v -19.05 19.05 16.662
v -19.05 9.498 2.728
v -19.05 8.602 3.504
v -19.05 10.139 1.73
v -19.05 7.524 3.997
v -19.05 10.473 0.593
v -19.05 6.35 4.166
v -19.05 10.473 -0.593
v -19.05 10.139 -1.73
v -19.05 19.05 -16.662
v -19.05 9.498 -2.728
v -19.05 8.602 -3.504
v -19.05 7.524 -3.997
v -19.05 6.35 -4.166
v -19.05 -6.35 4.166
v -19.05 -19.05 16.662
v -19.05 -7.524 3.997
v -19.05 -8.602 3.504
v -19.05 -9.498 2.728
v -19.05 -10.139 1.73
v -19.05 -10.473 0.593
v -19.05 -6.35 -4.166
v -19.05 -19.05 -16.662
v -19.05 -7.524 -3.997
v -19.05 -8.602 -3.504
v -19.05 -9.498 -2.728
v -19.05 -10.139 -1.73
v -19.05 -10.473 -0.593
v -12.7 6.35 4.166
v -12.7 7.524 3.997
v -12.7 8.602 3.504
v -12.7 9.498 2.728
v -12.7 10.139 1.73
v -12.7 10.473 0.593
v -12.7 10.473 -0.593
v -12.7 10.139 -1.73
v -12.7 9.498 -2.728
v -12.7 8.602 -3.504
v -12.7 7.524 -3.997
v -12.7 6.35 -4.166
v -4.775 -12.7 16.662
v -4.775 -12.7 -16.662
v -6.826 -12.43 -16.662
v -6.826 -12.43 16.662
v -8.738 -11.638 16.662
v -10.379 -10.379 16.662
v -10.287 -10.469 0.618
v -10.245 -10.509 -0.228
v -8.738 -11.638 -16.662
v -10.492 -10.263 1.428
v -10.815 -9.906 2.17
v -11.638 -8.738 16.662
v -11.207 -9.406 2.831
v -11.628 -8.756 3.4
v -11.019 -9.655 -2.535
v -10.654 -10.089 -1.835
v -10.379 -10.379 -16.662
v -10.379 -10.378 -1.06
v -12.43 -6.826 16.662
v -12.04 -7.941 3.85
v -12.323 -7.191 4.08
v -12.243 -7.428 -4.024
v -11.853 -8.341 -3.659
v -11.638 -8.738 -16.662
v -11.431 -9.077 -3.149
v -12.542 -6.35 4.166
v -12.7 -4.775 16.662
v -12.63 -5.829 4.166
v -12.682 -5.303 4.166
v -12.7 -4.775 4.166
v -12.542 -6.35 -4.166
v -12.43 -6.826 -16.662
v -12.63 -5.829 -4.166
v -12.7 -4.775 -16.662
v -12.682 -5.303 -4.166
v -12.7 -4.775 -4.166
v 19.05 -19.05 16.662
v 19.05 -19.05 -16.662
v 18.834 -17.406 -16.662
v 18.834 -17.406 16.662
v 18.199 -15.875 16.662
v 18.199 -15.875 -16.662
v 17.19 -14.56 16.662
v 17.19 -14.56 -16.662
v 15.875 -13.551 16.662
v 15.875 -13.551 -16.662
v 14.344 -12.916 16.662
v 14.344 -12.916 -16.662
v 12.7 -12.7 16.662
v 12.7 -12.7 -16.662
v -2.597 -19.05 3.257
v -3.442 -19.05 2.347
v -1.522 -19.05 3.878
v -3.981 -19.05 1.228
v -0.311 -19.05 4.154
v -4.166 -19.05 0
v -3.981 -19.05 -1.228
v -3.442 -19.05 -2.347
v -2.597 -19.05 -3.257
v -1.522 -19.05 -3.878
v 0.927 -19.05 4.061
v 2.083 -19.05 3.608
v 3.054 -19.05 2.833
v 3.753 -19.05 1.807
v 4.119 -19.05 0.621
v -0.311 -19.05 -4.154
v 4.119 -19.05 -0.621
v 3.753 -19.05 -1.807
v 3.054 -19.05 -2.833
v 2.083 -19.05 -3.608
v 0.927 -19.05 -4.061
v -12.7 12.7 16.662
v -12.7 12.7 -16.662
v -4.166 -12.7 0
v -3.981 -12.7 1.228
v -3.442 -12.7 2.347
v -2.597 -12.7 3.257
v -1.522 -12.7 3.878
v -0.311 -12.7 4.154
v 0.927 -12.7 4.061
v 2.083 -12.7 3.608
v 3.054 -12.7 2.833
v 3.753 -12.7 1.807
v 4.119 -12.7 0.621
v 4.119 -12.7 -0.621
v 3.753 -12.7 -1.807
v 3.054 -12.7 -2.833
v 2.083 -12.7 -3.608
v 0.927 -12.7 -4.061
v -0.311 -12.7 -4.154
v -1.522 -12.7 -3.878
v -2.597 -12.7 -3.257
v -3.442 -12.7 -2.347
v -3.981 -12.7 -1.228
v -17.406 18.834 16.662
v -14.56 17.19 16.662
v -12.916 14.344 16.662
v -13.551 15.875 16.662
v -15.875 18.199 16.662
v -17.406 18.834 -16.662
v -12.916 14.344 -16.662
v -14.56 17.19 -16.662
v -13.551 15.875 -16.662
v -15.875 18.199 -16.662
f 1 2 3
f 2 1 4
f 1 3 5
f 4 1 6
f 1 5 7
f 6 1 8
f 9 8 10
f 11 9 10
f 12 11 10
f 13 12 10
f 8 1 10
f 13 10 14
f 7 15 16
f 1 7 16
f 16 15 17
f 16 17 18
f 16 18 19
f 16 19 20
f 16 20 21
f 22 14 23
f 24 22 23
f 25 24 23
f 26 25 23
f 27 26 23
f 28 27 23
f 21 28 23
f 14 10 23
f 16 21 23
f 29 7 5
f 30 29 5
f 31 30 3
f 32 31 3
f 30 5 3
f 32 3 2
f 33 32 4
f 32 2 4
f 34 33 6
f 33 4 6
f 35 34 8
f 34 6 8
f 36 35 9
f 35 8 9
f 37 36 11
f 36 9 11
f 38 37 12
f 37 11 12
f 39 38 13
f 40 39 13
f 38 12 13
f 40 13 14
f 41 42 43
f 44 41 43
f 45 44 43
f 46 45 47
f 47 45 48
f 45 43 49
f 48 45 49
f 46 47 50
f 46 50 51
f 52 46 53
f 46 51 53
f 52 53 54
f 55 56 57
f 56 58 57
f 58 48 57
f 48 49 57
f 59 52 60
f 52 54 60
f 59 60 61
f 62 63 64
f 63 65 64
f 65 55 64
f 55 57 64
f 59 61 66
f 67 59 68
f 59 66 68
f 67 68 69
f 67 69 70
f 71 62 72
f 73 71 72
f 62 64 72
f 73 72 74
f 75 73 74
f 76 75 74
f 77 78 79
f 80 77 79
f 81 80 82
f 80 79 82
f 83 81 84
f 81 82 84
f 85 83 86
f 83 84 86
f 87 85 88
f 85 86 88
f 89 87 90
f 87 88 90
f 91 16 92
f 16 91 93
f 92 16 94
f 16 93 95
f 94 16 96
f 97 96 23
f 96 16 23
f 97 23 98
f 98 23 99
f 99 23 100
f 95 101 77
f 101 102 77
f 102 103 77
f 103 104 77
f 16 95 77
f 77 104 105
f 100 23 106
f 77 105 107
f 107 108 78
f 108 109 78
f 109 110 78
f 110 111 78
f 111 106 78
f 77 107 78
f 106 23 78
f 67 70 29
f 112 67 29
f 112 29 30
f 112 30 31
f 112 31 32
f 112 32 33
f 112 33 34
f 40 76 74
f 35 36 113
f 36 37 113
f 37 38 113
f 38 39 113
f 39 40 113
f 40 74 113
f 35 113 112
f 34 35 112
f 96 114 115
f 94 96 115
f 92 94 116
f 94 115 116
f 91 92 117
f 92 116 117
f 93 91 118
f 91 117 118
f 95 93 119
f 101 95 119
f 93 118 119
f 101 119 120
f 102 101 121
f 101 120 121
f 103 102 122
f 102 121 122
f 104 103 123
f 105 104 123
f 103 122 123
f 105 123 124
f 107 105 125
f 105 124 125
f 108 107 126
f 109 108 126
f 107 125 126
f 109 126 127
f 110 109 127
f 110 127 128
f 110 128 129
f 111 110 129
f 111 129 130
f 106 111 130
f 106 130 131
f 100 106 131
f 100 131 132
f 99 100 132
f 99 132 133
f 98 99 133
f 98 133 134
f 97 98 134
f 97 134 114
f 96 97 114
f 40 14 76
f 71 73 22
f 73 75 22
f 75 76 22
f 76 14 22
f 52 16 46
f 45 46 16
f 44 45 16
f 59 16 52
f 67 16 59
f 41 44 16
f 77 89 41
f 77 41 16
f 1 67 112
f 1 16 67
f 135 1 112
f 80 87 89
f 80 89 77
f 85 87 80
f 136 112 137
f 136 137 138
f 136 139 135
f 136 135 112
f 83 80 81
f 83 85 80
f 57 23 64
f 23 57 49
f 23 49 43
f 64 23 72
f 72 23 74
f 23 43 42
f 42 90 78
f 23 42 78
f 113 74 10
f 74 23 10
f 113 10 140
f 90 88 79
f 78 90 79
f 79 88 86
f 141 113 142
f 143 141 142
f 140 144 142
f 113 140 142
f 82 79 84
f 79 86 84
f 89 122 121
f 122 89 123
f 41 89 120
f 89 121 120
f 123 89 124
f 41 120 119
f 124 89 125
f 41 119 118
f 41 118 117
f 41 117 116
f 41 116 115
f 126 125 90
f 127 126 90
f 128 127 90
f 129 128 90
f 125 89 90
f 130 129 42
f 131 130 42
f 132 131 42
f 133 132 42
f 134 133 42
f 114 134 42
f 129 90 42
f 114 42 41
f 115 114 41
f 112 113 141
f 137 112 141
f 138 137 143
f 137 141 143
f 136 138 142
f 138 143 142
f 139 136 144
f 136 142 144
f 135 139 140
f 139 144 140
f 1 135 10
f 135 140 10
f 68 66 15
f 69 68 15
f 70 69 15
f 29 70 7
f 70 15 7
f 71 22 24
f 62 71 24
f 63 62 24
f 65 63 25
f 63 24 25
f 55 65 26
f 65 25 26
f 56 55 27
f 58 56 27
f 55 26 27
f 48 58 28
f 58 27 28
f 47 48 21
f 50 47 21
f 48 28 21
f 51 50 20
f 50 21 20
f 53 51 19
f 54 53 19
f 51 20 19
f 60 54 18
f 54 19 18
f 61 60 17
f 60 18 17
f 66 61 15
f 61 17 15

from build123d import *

# Parameters (mm, degrees)
BOSS_EXTRUDE1_DEPTH      = 16.6624
BOSS_EXTRUDE1_DEPTH_BACK = 16.6624
CUT_EXTRUDE1_DEPTH       = 41.602962623
CUT_EXTRUDE1_DEPTH_BACK  = 41.602962623
SKETCH6_R                = 4.1656
CUT_EXTRUDE2_DEPTH       = 41.602962711


with BuildPart() as part:
    # Sketch4 → Boss-Extrude1 (new, two sides: drawn at the far end of the back side and taken through both)
    with BuildSketch(Plane.XY.offset(-BOSS_EXTRUDE1_DEPTH_BACK)):
        with BuildLine():
            Line((-19.05, 19.05), (-19.05, -19.05))
            Line((-19.05, -19.05), (19.05, -19.05))
            ThreePointArc((19.05, -19.05), (17.190128061, -14.559871939), (12.7, -12.7))
            Line((12.7, -12.7), (-4.7752, -12.7))
            ThreePointArc((-4.7752, -12.7), (-10.37887982, -10.37887982), (-12.7, -4.7752))
            Line((-12.7, -4.7752), (-12.7, 12.7))
            ThreePointArc((-12.7, 12.7), (-14.559871939, 17.190128061), (-19.05, 19.05))
        make_face()
    extrude(amount=BOSS_EXTRUDE1_DEPTH + BOSS_EXTRUDE1_DEPTH_BACK)

    # Sketch5 → Cut-Extrude1 (cut, two sides: drawn at the far end of the back side and taken through both)
    with BuildSketch(Plane(origin=(-12.7, 0, 0), x_dir=(0, 0, -1), z_dir=(1, 0, 0)).offset(-CUT_EXTRUDE1_DEPTH_BACK)):
        with BuildLine():
            Line((4.1656, 6.35), (4.1656, -6.35))
            ThreePointArc((4.1656, -6.35), (0, -10.5156), (-4.1656, -6.35))
            Line((-4.1656, -6.35), (-4.1656, 6.35))
            ThreePointArc((-4.1656, 6.35), (0, 10.5156), (4.1656, 6.35))
        make_face()
    extrude(amount=CUT_EXTRUDE1_DEPTH + CUT_EXTRUDE1_DEPTH_BACK, mode=Mode.SUBTRACT)

    # Sketch6 → Cut-Extrude2 (cut, through all)
    with BuildSketch(Plane(origin=(0, -12.7, 0), x_dir=(1, 0, 0), z_dir=(0, 1, 0))):
        with Locations(Location((0, 0, 0), (0, 0, 180))):
            Circle(SKETCH6_R)
    extrude(amount=-CUT_EXTRUDE2_DEPTH, mode=Mode.SUBTRACT)


solid = part.part
